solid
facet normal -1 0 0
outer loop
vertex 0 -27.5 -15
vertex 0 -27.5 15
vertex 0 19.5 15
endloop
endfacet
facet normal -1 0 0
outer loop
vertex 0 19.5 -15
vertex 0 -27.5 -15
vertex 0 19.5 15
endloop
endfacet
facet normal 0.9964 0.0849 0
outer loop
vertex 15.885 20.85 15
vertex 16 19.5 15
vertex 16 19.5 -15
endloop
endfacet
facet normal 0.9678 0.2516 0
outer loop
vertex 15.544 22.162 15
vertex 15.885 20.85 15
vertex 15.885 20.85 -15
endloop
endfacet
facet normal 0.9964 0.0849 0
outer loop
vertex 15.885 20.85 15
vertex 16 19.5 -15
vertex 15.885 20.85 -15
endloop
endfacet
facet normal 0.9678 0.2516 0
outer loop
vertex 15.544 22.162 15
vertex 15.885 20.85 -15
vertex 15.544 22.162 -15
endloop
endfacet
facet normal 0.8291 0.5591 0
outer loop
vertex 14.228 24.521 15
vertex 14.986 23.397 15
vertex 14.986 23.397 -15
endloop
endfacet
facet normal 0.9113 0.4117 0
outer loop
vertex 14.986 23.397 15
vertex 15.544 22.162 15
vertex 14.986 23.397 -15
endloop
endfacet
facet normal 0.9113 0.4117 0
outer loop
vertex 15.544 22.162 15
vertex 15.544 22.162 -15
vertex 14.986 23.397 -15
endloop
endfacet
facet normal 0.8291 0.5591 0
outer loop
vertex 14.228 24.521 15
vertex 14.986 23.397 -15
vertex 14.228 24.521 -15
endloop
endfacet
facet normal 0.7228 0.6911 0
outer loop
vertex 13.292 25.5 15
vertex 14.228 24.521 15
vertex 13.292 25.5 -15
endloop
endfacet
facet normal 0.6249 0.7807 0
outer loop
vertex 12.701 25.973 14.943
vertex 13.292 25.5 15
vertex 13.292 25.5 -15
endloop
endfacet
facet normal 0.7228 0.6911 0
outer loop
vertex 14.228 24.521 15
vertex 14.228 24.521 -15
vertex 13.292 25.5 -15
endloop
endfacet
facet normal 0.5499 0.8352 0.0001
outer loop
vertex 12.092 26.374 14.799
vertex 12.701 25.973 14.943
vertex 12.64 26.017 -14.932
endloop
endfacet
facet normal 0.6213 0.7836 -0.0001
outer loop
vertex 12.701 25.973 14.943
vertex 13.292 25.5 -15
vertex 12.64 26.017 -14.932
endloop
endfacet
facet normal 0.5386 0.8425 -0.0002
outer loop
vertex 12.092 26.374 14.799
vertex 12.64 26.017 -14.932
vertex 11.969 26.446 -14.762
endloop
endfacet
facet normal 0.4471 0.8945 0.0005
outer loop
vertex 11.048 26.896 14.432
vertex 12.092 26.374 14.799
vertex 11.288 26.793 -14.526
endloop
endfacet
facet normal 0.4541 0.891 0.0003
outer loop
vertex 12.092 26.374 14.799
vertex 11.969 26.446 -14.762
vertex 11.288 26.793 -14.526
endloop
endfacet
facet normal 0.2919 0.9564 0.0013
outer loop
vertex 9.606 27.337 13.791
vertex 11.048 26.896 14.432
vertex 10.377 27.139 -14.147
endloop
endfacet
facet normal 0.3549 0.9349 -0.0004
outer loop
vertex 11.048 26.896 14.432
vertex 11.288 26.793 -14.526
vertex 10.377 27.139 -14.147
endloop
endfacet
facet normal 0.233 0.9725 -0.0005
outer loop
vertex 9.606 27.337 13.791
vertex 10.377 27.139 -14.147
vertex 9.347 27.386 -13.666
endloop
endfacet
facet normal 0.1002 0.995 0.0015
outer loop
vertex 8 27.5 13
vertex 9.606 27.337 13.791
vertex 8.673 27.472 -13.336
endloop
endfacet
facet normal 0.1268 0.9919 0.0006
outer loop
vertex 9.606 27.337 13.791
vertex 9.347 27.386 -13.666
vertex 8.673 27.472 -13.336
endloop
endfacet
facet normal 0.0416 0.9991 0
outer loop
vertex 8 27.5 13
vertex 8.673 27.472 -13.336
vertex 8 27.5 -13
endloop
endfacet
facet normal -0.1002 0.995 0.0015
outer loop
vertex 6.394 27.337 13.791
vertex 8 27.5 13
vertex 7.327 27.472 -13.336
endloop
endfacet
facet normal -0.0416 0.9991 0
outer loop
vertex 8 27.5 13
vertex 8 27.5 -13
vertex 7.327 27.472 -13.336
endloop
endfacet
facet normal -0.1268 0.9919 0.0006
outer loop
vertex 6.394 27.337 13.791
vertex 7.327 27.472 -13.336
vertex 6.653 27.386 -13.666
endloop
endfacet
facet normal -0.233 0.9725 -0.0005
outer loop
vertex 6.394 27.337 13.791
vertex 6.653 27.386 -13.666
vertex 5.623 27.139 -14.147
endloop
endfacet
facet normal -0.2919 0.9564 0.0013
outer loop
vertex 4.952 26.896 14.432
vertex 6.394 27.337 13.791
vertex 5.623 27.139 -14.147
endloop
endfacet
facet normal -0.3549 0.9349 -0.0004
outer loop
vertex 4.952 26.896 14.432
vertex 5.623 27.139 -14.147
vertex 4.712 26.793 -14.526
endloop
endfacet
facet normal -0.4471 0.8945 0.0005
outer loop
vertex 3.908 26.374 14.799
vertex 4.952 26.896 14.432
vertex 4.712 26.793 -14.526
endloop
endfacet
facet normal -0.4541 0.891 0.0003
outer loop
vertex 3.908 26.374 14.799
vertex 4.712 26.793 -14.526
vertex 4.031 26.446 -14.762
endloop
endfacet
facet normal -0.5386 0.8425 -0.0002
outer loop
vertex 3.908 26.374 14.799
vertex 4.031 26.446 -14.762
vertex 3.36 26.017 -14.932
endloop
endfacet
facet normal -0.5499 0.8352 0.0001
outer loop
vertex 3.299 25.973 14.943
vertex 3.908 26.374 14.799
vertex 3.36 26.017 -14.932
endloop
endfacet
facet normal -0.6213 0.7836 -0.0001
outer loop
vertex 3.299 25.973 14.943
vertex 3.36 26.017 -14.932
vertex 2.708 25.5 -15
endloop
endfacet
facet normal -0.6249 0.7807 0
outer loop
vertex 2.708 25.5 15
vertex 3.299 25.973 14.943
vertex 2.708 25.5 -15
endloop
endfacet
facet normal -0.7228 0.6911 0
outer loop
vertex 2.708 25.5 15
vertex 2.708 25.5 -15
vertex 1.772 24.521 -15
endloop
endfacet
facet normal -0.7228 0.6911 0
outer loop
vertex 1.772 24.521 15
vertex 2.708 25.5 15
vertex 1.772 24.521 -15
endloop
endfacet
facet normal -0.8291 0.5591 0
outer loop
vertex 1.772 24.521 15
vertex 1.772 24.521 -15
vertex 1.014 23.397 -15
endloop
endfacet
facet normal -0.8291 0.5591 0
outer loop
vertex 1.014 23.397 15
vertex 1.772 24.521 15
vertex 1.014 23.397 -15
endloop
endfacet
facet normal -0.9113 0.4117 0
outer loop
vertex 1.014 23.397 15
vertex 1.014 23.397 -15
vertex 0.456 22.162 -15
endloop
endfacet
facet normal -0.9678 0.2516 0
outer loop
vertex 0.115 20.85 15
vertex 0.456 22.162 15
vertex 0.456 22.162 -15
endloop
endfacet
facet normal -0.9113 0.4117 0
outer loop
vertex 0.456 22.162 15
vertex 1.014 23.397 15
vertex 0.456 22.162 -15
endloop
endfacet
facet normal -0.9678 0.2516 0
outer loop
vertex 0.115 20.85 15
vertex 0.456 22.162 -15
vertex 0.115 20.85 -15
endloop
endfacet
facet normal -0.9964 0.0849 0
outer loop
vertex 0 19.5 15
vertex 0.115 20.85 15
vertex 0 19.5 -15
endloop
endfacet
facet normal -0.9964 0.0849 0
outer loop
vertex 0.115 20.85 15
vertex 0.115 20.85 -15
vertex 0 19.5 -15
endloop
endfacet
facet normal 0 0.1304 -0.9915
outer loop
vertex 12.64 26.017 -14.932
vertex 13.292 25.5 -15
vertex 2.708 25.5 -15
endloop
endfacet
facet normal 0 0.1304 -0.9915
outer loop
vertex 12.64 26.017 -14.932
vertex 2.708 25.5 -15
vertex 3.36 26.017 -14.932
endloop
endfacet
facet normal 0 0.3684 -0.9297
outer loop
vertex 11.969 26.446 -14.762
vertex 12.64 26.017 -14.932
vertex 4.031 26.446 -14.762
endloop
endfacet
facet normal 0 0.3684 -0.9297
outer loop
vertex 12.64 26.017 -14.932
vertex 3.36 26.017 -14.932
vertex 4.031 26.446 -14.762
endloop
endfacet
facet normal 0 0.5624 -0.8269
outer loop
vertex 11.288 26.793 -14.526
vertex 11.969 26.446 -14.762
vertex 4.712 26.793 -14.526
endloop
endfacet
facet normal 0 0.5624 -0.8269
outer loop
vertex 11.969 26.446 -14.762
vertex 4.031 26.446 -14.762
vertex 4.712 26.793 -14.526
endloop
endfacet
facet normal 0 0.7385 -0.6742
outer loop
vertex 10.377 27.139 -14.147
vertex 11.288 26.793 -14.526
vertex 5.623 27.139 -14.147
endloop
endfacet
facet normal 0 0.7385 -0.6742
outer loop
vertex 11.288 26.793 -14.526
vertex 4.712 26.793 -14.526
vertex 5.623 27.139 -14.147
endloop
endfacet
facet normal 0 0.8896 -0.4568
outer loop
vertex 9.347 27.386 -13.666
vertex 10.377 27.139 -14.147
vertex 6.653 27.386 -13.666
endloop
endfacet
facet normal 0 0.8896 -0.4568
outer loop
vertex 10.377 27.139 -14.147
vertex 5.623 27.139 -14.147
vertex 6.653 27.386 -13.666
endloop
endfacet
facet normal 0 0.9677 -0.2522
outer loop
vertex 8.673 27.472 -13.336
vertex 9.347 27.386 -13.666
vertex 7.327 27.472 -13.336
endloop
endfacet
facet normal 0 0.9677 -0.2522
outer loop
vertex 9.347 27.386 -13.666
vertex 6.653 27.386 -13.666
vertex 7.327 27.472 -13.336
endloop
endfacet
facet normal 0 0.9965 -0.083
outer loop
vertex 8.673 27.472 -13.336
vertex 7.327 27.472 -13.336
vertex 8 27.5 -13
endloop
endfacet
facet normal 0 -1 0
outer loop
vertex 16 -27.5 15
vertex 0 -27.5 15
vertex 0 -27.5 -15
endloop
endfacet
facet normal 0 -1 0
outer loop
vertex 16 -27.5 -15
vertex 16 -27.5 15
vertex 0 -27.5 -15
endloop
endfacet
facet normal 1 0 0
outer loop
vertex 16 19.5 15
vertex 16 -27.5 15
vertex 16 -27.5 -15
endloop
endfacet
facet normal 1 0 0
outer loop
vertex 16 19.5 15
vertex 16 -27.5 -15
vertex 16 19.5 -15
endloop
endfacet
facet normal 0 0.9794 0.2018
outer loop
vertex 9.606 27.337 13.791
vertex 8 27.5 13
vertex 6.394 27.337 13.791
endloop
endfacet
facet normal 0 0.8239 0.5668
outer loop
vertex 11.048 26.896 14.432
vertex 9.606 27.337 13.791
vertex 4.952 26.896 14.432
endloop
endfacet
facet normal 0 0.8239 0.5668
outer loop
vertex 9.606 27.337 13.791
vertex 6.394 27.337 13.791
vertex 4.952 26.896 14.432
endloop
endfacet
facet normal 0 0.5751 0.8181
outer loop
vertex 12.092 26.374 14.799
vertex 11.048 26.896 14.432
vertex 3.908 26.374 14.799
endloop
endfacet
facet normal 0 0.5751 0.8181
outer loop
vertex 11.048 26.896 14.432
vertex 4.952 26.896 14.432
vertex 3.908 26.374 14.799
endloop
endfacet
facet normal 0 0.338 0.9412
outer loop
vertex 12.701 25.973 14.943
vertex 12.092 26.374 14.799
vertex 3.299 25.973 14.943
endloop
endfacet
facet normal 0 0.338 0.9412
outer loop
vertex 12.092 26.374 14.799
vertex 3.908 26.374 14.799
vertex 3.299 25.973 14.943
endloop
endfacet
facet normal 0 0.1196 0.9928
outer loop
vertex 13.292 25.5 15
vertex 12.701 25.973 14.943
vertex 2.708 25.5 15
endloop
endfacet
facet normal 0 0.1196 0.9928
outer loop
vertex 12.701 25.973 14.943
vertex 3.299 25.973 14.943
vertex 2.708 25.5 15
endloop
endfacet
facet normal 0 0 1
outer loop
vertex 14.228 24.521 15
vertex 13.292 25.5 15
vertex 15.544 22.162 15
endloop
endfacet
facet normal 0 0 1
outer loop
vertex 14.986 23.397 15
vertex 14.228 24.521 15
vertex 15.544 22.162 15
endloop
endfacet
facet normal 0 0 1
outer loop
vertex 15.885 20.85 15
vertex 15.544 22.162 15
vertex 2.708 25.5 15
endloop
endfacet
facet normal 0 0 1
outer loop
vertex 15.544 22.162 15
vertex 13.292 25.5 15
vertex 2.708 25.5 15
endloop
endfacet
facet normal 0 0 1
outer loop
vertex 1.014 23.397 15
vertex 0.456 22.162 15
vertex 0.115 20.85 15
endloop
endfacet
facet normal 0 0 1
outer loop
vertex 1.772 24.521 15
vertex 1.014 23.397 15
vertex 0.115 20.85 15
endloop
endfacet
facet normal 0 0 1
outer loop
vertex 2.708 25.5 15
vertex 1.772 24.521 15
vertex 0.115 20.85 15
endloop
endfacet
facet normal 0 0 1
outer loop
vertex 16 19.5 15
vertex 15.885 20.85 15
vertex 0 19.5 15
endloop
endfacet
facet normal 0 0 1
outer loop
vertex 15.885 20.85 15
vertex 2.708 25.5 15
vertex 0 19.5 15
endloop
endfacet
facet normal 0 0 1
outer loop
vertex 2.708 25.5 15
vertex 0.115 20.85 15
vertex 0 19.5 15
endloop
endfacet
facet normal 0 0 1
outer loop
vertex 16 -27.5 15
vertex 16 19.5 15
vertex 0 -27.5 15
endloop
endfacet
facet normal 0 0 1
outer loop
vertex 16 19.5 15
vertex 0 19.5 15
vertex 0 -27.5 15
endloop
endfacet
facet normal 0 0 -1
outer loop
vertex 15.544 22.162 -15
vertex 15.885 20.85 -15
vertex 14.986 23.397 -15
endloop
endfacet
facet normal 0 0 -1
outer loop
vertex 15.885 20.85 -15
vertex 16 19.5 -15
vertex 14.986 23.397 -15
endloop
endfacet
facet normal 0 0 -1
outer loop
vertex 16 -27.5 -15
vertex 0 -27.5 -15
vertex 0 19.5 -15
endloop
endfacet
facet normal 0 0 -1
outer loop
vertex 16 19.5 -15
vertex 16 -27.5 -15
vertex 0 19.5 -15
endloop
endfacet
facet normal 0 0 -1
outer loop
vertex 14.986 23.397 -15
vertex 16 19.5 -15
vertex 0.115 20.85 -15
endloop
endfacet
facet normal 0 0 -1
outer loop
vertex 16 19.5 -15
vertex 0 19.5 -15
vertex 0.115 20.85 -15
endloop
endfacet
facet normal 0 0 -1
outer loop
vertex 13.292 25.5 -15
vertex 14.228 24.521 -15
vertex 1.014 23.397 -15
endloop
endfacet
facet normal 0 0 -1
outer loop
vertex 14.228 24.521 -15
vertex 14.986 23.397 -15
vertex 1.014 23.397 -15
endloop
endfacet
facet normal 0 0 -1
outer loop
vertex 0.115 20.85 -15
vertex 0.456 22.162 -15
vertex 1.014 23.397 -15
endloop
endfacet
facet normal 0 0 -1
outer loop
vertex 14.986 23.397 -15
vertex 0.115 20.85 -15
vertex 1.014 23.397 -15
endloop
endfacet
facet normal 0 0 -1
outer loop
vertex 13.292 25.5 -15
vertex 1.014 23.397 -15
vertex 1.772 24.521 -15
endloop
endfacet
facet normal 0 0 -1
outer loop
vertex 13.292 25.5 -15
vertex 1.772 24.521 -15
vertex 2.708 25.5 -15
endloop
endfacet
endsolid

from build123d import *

# Parameters (mm, degrees)
BOSS_EXTRUDE1_DEPTH = 16
FILLET6_R           = 8
FILLET7_R           = 8


with BuildPart() as part:
    # Sketch1 → Boss-Extrude1 (new body)
    with BuildSketch(Plane.YZ):
        with BuildLine():
            Line((-27.5, -15), (25.5, -15))
            ThreePointArc((25.5, -15), (26.914213562, -14.414213562), (27.5, -13))
            Line((27.5, -13), (27.5, 13))
            ThreePointArc((27.5, 13), (26.914213562, 14.414213562), (25.5, 15))
            Line((25.5, 15), (-27.5, 15))
            Line((-27.5, 15), (-27.5, -15))
        make_face()
    extrude(amount=BOSS_EXTRUDE1_DEPTH)

    # Fillet6
    # the kernel refuses this fillet: 8 mm, written as the material it takes off along each edge
    with BuildSketch(Plane(origin=(16, 27.5, -33), x_dir=(-1, 0, 0), z_dir=(0, 0, 1))) as fillet6_piece_1:
        with BuildLine():
            CenterArc((FILLET6_R, FILLET6_R), FILLET6_R, 180, 90)
            Line((0, FILLET6_R), (0, 0))
            Line((0, 0), (FILLET6_R, 0))
        make_face()
    extrude(amount=66, mode=Mode.SUBTRACT)

    # Fillet7
    # the kernel refuses this fillet: 8 mm, written as the material it takes off along each edge
    with BuildSketch(Plane(origin=(0, 27.5, -33), x_dir=(0, -1, 0), z_dir=(0, 0, 1))) as fillet7_piece_1:
        with BuildLine():
            CenterArc((FILLET7_R, FILLET7_R), FILLET7_R, 180, 90)
            Line((0, FILLET7_R), (0, 0))
            Line((0, 0), (FILLET7_R, 0))
        make_face()
    extrude(amount=66, mode=Mode.SUBTRACT)


solid = part.part
